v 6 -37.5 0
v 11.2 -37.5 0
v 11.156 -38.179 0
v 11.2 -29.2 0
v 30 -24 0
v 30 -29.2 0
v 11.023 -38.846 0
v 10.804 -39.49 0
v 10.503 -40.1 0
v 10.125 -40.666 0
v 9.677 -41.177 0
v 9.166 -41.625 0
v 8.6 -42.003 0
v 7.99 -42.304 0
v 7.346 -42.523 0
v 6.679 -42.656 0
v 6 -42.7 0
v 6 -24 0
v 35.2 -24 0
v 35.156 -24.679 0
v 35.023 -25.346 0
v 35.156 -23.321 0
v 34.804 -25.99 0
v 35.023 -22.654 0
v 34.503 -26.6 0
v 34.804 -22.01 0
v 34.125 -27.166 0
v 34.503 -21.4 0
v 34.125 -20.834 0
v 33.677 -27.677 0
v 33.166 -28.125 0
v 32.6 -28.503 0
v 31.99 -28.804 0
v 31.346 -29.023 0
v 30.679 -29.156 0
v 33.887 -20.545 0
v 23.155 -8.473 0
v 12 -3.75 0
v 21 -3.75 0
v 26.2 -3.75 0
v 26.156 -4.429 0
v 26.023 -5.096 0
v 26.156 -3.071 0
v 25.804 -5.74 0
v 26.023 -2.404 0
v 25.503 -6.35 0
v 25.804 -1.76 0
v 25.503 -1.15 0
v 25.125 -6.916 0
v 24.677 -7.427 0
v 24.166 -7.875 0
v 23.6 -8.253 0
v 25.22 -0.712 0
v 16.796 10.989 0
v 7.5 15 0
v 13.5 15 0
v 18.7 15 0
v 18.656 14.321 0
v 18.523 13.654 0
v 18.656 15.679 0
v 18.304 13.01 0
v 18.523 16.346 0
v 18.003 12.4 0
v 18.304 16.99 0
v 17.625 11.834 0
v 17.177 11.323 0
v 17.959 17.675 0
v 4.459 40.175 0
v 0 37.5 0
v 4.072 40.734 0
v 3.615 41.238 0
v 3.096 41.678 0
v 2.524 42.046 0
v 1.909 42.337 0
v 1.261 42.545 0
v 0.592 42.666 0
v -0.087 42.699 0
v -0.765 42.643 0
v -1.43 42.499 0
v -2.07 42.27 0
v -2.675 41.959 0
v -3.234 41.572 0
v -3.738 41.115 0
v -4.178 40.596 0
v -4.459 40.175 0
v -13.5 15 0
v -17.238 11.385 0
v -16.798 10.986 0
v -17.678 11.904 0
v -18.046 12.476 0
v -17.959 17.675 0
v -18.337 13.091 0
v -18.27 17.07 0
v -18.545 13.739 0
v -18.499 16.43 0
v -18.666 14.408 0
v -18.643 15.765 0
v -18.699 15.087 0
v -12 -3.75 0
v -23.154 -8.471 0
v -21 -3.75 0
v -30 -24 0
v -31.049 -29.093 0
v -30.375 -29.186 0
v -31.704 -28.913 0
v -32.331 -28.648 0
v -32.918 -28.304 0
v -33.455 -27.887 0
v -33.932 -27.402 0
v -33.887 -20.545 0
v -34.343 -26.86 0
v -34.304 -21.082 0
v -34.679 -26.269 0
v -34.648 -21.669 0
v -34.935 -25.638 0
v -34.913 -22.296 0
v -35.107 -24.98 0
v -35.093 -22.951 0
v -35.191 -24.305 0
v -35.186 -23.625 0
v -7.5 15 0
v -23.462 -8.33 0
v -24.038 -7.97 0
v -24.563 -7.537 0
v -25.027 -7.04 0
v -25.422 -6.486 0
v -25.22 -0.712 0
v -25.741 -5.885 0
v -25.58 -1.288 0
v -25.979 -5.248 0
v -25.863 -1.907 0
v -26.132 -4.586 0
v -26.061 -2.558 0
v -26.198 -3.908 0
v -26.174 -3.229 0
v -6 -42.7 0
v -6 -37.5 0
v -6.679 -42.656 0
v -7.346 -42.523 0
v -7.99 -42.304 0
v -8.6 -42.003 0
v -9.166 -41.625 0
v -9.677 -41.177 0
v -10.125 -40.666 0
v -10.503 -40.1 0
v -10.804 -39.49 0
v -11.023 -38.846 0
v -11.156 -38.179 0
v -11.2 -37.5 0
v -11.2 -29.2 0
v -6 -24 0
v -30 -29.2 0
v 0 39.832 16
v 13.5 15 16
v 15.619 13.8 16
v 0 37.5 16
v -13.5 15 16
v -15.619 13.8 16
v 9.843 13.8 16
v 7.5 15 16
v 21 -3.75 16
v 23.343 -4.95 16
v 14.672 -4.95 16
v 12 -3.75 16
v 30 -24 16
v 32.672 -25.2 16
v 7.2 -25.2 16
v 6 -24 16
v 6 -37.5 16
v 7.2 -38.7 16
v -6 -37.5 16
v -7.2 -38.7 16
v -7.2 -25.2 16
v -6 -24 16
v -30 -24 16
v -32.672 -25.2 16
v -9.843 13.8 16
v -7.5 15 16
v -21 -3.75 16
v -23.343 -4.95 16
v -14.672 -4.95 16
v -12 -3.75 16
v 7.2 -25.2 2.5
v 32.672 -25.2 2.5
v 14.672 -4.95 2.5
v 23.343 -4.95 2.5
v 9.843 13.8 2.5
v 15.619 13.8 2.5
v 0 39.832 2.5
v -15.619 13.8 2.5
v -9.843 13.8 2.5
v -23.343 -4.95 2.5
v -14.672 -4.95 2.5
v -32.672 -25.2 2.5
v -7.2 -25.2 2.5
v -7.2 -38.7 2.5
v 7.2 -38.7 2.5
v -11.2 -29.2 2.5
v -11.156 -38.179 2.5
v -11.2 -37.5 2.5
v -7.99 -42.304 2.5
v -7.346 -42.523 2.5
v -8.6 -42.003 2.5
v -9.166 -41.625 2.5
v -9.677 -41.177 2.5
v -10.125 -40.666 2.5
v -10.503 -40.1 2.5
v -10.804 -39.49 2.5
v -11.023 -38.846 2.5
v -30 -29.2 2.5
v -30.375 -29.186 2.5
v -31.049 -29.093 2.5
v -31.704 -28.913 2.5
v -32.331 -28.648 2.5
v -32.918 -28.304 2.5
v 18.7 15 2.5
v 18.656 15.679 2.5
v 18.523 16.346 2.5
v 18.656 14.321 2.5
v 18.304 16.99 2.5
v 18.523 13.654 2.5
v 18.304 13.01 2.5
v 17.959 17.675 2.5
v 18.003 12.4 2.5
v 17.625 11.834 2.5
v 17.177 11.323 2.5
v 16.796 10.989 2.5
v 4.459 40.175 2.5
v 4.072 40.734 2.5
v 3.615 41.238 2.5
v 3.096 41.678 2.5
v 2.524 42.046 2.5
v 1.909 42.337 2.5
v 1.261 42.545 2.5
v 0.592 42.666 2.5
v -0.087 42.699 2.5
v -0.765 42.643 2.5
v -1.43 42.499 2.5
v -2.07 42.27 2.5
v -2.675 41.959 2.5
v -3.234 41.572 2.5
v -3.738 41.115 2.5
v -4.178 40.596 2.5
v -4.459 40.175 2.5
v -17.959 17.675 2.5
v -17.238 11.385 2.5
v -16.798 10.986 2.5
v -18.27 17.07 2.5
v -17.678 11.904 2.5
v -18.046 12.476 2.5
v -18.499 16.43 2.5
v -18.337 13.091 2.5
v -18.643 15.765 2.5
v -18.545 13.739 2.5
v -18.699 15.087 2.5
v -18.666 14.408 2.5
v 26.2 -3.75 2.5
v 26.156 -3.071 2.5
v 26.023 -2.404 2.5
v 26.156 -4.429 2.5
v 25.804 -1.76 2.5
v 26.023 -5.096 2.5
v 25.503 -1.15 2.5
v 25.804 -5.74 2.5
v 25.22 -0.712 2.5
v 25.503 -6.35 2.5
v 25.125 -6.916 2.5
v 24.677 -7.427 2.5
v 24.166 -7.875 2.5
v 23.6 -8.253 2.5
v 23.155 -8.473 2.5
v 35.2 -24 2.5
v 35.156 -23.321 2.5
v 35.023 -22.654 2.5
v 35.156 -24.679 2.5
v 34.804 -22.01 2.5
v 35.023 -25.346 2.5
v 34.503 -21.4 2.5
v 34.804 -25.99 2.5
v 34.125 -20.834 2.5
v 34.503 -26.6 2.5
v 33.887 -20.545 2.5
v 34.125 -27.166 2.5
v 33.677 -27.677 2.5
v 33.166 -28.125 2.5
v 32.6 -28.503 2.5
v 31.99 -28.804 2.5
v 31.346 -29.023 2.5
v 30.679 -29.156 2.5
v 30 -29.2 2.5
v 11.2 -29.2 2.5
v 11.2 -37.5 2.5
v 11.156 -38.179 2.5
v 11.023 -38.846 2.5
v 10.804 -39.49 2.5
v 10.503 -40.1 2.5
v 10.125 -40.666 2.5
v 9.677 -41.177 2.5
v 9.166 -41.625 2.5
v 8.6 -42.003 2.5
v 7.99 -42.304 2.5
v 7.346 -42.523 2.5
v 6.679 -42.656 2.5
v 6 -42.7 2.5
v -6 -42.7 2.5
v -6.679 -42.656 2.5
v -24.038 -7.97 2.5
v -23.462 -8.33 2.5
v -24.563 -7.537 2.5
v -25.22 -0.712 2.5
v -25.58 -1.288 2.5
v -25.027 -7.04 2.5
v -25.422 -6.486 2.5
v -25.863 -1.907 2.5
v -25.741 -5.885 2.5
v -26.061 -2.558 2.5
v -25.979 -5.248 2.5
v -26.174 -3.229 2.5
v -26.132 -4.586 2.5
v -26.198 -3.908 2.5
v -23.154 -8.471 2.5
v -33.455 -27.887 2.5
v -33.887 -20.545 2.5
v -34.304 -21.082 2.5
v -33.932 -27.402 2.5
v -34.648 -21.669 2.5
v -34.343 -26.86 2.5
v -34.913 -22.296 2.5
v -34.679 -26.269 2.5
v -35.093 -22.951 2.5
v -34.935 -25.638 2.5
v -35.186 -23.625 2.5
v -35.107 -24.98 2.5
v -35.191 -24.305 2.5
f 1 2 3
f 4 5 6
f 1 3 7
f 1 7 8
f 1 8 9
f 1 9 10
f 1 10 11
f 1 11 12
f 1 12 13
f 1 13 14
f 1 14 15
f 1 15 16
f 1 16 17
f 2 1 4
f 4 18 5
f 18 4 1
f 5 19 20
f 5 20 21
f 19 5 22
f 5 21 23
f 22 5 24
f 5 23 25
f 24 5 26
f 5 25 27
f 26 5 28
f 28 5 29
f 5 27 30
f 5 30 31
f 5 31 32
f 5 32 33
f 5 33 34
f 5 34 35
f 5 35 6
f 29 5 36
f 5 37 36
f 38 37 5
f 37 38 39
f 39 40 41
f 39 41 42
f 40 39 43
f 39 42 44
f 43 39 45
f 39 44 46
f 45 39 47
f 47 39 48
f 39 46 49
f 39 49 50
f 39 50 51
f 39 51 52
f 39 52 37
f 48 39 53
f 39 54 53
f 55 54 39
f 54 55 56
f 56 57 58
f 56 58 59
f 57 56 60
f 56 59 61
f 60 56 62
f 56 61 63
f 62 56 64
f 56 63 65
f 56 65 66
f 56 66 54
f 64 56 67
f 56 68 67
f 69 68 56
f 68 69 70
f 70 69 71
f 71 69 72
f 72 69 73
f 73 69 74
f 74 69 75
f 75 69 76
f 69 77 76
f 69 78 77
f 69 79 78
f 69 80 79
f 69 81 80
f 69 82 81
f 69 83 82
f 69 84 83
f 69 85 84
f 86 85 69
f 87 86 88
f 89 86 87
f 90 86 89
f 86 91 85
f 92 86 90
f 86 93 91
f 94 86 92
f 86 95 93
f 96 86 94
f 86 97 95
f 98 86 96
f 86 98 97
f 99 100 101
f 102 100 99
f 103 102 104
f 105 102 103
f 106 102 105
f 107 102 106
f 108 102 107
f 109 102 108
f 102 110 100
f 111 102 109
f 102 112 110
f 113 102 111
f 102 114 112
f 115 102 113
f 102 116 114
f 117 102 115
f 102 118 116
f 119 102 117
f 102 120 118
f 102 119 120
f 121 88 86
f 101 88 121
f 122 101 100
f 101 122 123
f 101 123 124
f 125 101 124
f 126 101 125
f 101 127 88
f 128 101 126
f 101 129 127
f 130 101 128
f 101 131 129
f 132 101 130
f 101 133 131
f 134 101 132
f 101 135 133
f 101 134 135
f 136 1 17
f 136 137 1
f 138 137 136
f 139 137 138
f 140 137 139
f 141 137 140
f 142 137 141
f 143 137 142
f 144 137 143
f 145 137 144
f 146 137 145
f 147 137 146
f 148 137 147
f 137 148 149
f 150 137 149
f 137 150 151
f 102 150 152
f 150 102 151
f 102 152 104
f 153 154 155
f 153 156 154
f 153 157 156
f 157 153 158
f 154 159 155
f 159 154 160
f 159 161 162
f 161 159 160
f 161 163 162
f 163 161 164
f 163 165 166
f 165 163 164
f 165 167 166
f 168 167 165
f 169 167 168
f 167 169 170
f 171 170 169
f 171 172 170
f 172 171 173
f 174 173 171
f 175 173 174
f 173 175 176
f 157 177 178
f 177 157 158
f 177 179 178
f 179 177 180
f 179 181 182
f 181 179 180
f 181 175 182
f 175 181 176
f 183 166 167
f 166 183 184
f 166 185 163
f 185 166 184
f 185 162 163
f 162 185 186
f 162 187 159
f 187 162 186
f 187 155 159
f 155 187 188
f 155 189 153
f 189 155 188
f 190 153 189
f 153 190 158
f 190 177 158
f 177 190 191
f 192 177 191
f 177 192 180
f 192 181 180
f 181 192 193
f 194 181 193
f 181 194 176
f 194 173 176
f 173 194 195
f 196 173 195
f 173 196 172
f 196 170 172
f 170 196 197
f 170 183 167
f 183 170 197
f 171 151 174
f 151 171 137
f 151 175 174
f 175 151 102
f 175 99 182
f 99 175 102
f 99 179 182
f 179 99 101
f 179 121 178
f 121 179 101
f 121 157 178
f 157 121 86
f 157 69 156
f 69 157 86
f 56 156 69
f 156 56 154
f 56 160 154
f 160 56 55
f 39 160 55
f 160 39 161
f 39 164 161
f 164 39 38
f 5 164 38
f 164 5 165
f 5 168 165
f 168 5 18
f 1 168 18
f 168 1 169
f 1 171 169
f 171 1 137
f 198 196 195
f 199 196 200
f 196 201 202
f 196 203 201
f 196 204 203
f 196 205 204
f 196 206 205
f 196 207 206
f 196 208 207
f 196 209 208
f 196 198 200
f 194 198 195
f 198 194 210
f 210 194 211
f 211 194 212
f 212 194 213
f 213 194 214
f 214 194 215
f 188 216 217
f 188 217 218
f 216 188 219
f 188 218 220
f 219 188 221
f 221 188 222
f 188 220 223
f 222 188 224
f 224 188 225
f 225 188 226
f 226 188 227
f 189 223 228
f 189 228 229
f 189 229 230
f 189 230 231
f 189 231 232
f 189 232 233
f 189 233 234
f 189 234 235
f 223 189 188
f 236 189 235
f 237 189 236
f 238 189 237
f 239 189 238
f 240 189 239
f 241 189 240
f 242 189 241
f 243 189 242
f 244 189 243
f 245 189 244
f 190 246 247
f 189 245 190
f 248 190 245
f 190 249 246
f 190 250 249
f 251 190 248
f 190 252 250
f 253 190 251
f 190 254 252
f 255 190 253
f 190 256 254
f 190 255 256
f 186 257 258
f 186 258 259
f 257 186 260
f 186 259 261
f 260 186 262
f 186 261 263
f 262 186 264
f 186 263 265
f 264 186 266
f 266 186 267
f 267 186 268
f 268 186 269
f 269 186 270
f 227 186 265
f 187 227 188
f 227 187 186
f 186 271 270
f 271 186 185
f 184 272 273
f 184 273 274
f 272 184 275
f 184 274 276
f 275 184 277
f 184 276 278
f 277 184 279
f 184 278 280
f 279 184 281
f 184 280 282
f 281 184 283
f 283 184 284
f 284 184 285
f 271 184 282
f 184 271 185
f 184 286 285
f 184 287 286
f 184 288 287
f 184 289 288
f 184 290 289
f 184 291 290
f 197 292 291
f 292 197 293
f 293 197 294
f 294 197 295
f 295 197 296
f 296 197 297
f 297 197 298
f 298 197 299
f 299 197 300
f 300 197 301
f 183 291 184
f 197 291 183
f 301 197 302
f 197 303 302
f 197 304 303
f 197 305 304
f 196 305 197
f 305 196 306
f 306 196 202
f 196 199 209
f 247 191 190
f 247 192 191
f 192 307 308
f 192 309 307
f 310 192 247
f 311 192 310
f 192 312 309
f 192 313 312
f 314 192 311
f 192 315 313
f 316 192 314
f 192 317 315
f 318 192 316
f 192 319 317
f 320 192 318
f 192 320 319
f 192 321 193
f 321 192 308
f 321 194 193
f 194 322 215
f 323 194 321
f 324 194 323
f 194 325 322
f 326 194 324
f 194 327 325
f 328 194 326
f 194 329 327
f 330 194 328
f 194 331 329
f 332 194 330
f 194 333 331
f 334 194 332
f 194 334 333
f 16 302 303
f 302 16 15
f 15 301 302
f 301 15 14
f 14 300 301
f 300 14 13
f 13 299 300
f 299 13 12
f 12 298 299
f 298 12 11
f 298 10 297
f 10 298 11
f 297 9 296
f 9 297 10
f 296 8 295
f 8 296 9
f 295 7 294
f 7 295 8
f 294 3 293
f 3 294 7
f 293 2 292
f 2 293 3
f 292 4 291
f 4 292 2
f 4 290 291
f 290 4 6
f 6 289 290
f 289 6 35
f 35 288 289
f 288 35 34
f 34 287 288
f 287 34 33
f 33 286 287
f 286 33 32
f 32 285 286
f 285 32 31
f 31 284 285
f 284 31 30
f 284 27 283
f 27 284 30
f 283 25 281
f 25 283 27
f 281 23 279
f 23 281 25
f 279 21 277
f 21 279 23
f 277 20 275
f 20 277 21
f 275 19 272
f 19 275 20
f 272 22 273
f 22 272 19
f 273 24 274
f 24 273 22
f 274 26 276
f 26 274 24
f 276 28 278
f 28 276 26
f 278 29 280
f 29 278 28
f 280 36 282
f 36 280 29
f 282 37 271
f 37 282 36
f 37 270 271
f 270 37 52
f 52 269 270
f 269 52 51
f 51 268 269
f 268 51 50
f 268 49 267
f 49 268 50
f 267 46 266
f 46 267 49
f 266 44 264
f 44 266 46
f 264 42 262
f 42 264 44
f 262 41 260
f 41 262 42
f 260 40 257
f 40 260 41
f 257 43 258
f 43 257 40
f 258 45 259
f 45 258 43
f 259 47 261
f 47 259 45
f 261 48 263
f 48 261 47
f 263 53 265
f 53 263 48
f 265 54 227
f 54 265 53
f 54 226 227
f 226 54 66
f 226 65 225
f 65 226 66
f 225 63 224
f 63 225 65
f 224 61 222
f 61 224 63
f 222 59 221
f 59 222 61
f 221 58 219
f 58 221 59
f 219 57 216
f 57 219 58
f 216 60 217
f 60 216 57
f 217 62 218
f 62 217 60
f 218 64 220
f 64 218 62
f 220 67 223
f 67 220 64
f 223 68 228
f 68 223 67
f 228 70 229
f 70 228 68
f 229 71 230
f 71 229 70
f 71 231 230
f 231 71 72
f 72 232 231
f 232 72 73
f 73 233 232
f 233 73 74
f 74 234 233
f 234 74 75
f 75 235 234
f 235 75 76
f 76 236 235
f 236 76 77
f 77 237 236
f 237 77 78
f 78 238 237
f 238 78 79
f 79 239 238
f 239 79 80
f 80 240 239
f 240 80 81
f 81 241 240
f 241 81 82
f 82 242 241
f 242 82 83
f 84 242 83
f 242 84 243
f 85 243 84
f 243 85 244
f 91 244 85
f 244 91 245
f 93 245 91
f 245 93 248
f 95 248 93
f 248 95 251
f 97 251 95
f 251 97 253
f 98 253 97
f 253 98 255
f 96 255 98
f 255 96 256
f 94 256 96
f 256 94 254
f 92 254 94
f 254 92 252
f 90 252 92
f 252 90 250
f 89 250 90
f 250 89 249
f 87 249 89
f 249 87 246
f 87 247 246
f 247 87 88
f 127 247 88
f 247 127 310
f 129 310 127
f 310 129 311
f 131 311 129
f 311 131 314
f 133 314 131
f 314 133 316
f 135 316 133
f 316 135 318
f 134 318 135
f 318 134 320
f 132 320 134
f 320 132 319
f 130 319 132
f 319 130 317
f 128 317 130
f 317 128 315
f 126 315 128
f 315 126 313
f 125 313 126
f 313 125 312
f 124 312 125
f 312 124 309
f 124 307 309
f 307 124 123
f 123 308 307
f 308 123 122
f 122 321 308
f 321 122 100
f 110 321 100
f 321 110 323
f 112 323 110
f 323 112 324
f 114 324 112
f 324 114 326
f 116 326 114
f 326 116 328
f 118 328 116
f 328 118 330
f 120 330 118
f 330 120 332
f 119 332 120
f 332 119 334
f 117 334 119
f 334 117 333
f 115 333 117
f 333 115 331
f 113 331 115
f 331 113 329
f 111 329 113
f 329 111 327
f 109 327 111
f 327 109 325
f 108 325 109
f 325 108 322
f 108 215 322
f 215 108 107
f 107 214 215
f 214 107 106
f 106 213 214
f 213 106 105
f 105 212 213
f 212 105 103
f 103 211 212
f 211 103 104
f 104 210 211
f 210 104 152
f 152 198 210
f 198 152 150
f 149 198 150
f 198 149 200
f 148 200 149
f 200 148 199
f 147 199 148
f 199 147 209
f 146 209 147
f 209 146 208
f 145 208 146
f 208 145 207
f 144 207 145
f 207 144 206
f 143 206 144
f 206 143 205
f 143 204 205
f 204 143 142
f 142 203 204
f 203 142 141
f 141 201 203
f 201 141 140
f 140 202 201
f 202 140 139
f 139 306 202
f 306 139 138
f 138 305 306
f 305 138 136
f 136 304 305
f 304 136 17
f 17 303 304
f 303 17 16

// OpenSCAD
// Christmas cookie cutter - original parametric design (Brian Sacco)
// Flat flange on the bed, thin cutting wall pointing up: no overhangs, no supports.
kind     = "tree";   // "tree", "star", "bell", "person", "bauble"
size     = 75;       // longest side of the cookie shape (mm)
wall     = 1.2;      // cutting wall (3 perimeters of a 0.4 mm nozzle)
h        = 16;       // total height
flange_w = 4;        // pressing flange, outwards from the wall
flange_t = 2.5;      // flange thickness
$fn = 48;

// all shapes are drawn in a 100 mm reference box and scaled to `size`
module tree() {
    pts = [[0,50],[-18,20],[-10,20],[-28,-5],[-16,-5],[-40,-32],[-8,-32],[-8,-50],
           [8,-50],[8,-32],[40,-32],[16,-5],[28,-5],[10,20],[18,20]];
    polygon(pts);
}
module star() {
    polygon([for (i = [0:9]) let (a = 90 + i * 36, r = i % 2 == 0 ? 50 : 21) [r * cos(a), r * sin(a)]]);
}
module bell() {
    hull() { translate([0, 14]) circle(r = 30); translate([-45, -30]) square([90, 8]); }
    translate([0, -32]) circle(r = 8);
    translate([0, 44]) circle(r = 7);
}
module person() {
    translate([0, 36]) circle(r = 14);
    hull() { translate([0, 12]) circle(r = 18); translate([0, -8]) circle(r = 16); }
    for (s = [-1, 1]) {
        hull() { translate([s * 40, 14]) circle(r = 7); translate([0, 16]) circle(r = 10); }
        hull() { translate([s * 12, -30]) circle(r = 8); translate([s * 16, -44]) circle(r = 8); }
    }
}
module bauble() {
    translate([0, -4]) circle(r = 42);
    translate([-8, 34]) square([16, 14]);
}
module shape() {
    scale(size / 100) {
        if (kind == "tree") tree();
        else if (kind == "star") star();
        else if (kind == "bell") bell();
        else if (kind == "person") person();
        else bauble();
    }
}
// cutting wall
linear_extrude(h) difference() { offset(delta = wall) shape(); shape(); }
// pressing flange (rounded outside so it is comfortable on the hand)
linear_extrude(flange_t) difference() { offset(r = wall + flange_w) shape(); shape(); }
